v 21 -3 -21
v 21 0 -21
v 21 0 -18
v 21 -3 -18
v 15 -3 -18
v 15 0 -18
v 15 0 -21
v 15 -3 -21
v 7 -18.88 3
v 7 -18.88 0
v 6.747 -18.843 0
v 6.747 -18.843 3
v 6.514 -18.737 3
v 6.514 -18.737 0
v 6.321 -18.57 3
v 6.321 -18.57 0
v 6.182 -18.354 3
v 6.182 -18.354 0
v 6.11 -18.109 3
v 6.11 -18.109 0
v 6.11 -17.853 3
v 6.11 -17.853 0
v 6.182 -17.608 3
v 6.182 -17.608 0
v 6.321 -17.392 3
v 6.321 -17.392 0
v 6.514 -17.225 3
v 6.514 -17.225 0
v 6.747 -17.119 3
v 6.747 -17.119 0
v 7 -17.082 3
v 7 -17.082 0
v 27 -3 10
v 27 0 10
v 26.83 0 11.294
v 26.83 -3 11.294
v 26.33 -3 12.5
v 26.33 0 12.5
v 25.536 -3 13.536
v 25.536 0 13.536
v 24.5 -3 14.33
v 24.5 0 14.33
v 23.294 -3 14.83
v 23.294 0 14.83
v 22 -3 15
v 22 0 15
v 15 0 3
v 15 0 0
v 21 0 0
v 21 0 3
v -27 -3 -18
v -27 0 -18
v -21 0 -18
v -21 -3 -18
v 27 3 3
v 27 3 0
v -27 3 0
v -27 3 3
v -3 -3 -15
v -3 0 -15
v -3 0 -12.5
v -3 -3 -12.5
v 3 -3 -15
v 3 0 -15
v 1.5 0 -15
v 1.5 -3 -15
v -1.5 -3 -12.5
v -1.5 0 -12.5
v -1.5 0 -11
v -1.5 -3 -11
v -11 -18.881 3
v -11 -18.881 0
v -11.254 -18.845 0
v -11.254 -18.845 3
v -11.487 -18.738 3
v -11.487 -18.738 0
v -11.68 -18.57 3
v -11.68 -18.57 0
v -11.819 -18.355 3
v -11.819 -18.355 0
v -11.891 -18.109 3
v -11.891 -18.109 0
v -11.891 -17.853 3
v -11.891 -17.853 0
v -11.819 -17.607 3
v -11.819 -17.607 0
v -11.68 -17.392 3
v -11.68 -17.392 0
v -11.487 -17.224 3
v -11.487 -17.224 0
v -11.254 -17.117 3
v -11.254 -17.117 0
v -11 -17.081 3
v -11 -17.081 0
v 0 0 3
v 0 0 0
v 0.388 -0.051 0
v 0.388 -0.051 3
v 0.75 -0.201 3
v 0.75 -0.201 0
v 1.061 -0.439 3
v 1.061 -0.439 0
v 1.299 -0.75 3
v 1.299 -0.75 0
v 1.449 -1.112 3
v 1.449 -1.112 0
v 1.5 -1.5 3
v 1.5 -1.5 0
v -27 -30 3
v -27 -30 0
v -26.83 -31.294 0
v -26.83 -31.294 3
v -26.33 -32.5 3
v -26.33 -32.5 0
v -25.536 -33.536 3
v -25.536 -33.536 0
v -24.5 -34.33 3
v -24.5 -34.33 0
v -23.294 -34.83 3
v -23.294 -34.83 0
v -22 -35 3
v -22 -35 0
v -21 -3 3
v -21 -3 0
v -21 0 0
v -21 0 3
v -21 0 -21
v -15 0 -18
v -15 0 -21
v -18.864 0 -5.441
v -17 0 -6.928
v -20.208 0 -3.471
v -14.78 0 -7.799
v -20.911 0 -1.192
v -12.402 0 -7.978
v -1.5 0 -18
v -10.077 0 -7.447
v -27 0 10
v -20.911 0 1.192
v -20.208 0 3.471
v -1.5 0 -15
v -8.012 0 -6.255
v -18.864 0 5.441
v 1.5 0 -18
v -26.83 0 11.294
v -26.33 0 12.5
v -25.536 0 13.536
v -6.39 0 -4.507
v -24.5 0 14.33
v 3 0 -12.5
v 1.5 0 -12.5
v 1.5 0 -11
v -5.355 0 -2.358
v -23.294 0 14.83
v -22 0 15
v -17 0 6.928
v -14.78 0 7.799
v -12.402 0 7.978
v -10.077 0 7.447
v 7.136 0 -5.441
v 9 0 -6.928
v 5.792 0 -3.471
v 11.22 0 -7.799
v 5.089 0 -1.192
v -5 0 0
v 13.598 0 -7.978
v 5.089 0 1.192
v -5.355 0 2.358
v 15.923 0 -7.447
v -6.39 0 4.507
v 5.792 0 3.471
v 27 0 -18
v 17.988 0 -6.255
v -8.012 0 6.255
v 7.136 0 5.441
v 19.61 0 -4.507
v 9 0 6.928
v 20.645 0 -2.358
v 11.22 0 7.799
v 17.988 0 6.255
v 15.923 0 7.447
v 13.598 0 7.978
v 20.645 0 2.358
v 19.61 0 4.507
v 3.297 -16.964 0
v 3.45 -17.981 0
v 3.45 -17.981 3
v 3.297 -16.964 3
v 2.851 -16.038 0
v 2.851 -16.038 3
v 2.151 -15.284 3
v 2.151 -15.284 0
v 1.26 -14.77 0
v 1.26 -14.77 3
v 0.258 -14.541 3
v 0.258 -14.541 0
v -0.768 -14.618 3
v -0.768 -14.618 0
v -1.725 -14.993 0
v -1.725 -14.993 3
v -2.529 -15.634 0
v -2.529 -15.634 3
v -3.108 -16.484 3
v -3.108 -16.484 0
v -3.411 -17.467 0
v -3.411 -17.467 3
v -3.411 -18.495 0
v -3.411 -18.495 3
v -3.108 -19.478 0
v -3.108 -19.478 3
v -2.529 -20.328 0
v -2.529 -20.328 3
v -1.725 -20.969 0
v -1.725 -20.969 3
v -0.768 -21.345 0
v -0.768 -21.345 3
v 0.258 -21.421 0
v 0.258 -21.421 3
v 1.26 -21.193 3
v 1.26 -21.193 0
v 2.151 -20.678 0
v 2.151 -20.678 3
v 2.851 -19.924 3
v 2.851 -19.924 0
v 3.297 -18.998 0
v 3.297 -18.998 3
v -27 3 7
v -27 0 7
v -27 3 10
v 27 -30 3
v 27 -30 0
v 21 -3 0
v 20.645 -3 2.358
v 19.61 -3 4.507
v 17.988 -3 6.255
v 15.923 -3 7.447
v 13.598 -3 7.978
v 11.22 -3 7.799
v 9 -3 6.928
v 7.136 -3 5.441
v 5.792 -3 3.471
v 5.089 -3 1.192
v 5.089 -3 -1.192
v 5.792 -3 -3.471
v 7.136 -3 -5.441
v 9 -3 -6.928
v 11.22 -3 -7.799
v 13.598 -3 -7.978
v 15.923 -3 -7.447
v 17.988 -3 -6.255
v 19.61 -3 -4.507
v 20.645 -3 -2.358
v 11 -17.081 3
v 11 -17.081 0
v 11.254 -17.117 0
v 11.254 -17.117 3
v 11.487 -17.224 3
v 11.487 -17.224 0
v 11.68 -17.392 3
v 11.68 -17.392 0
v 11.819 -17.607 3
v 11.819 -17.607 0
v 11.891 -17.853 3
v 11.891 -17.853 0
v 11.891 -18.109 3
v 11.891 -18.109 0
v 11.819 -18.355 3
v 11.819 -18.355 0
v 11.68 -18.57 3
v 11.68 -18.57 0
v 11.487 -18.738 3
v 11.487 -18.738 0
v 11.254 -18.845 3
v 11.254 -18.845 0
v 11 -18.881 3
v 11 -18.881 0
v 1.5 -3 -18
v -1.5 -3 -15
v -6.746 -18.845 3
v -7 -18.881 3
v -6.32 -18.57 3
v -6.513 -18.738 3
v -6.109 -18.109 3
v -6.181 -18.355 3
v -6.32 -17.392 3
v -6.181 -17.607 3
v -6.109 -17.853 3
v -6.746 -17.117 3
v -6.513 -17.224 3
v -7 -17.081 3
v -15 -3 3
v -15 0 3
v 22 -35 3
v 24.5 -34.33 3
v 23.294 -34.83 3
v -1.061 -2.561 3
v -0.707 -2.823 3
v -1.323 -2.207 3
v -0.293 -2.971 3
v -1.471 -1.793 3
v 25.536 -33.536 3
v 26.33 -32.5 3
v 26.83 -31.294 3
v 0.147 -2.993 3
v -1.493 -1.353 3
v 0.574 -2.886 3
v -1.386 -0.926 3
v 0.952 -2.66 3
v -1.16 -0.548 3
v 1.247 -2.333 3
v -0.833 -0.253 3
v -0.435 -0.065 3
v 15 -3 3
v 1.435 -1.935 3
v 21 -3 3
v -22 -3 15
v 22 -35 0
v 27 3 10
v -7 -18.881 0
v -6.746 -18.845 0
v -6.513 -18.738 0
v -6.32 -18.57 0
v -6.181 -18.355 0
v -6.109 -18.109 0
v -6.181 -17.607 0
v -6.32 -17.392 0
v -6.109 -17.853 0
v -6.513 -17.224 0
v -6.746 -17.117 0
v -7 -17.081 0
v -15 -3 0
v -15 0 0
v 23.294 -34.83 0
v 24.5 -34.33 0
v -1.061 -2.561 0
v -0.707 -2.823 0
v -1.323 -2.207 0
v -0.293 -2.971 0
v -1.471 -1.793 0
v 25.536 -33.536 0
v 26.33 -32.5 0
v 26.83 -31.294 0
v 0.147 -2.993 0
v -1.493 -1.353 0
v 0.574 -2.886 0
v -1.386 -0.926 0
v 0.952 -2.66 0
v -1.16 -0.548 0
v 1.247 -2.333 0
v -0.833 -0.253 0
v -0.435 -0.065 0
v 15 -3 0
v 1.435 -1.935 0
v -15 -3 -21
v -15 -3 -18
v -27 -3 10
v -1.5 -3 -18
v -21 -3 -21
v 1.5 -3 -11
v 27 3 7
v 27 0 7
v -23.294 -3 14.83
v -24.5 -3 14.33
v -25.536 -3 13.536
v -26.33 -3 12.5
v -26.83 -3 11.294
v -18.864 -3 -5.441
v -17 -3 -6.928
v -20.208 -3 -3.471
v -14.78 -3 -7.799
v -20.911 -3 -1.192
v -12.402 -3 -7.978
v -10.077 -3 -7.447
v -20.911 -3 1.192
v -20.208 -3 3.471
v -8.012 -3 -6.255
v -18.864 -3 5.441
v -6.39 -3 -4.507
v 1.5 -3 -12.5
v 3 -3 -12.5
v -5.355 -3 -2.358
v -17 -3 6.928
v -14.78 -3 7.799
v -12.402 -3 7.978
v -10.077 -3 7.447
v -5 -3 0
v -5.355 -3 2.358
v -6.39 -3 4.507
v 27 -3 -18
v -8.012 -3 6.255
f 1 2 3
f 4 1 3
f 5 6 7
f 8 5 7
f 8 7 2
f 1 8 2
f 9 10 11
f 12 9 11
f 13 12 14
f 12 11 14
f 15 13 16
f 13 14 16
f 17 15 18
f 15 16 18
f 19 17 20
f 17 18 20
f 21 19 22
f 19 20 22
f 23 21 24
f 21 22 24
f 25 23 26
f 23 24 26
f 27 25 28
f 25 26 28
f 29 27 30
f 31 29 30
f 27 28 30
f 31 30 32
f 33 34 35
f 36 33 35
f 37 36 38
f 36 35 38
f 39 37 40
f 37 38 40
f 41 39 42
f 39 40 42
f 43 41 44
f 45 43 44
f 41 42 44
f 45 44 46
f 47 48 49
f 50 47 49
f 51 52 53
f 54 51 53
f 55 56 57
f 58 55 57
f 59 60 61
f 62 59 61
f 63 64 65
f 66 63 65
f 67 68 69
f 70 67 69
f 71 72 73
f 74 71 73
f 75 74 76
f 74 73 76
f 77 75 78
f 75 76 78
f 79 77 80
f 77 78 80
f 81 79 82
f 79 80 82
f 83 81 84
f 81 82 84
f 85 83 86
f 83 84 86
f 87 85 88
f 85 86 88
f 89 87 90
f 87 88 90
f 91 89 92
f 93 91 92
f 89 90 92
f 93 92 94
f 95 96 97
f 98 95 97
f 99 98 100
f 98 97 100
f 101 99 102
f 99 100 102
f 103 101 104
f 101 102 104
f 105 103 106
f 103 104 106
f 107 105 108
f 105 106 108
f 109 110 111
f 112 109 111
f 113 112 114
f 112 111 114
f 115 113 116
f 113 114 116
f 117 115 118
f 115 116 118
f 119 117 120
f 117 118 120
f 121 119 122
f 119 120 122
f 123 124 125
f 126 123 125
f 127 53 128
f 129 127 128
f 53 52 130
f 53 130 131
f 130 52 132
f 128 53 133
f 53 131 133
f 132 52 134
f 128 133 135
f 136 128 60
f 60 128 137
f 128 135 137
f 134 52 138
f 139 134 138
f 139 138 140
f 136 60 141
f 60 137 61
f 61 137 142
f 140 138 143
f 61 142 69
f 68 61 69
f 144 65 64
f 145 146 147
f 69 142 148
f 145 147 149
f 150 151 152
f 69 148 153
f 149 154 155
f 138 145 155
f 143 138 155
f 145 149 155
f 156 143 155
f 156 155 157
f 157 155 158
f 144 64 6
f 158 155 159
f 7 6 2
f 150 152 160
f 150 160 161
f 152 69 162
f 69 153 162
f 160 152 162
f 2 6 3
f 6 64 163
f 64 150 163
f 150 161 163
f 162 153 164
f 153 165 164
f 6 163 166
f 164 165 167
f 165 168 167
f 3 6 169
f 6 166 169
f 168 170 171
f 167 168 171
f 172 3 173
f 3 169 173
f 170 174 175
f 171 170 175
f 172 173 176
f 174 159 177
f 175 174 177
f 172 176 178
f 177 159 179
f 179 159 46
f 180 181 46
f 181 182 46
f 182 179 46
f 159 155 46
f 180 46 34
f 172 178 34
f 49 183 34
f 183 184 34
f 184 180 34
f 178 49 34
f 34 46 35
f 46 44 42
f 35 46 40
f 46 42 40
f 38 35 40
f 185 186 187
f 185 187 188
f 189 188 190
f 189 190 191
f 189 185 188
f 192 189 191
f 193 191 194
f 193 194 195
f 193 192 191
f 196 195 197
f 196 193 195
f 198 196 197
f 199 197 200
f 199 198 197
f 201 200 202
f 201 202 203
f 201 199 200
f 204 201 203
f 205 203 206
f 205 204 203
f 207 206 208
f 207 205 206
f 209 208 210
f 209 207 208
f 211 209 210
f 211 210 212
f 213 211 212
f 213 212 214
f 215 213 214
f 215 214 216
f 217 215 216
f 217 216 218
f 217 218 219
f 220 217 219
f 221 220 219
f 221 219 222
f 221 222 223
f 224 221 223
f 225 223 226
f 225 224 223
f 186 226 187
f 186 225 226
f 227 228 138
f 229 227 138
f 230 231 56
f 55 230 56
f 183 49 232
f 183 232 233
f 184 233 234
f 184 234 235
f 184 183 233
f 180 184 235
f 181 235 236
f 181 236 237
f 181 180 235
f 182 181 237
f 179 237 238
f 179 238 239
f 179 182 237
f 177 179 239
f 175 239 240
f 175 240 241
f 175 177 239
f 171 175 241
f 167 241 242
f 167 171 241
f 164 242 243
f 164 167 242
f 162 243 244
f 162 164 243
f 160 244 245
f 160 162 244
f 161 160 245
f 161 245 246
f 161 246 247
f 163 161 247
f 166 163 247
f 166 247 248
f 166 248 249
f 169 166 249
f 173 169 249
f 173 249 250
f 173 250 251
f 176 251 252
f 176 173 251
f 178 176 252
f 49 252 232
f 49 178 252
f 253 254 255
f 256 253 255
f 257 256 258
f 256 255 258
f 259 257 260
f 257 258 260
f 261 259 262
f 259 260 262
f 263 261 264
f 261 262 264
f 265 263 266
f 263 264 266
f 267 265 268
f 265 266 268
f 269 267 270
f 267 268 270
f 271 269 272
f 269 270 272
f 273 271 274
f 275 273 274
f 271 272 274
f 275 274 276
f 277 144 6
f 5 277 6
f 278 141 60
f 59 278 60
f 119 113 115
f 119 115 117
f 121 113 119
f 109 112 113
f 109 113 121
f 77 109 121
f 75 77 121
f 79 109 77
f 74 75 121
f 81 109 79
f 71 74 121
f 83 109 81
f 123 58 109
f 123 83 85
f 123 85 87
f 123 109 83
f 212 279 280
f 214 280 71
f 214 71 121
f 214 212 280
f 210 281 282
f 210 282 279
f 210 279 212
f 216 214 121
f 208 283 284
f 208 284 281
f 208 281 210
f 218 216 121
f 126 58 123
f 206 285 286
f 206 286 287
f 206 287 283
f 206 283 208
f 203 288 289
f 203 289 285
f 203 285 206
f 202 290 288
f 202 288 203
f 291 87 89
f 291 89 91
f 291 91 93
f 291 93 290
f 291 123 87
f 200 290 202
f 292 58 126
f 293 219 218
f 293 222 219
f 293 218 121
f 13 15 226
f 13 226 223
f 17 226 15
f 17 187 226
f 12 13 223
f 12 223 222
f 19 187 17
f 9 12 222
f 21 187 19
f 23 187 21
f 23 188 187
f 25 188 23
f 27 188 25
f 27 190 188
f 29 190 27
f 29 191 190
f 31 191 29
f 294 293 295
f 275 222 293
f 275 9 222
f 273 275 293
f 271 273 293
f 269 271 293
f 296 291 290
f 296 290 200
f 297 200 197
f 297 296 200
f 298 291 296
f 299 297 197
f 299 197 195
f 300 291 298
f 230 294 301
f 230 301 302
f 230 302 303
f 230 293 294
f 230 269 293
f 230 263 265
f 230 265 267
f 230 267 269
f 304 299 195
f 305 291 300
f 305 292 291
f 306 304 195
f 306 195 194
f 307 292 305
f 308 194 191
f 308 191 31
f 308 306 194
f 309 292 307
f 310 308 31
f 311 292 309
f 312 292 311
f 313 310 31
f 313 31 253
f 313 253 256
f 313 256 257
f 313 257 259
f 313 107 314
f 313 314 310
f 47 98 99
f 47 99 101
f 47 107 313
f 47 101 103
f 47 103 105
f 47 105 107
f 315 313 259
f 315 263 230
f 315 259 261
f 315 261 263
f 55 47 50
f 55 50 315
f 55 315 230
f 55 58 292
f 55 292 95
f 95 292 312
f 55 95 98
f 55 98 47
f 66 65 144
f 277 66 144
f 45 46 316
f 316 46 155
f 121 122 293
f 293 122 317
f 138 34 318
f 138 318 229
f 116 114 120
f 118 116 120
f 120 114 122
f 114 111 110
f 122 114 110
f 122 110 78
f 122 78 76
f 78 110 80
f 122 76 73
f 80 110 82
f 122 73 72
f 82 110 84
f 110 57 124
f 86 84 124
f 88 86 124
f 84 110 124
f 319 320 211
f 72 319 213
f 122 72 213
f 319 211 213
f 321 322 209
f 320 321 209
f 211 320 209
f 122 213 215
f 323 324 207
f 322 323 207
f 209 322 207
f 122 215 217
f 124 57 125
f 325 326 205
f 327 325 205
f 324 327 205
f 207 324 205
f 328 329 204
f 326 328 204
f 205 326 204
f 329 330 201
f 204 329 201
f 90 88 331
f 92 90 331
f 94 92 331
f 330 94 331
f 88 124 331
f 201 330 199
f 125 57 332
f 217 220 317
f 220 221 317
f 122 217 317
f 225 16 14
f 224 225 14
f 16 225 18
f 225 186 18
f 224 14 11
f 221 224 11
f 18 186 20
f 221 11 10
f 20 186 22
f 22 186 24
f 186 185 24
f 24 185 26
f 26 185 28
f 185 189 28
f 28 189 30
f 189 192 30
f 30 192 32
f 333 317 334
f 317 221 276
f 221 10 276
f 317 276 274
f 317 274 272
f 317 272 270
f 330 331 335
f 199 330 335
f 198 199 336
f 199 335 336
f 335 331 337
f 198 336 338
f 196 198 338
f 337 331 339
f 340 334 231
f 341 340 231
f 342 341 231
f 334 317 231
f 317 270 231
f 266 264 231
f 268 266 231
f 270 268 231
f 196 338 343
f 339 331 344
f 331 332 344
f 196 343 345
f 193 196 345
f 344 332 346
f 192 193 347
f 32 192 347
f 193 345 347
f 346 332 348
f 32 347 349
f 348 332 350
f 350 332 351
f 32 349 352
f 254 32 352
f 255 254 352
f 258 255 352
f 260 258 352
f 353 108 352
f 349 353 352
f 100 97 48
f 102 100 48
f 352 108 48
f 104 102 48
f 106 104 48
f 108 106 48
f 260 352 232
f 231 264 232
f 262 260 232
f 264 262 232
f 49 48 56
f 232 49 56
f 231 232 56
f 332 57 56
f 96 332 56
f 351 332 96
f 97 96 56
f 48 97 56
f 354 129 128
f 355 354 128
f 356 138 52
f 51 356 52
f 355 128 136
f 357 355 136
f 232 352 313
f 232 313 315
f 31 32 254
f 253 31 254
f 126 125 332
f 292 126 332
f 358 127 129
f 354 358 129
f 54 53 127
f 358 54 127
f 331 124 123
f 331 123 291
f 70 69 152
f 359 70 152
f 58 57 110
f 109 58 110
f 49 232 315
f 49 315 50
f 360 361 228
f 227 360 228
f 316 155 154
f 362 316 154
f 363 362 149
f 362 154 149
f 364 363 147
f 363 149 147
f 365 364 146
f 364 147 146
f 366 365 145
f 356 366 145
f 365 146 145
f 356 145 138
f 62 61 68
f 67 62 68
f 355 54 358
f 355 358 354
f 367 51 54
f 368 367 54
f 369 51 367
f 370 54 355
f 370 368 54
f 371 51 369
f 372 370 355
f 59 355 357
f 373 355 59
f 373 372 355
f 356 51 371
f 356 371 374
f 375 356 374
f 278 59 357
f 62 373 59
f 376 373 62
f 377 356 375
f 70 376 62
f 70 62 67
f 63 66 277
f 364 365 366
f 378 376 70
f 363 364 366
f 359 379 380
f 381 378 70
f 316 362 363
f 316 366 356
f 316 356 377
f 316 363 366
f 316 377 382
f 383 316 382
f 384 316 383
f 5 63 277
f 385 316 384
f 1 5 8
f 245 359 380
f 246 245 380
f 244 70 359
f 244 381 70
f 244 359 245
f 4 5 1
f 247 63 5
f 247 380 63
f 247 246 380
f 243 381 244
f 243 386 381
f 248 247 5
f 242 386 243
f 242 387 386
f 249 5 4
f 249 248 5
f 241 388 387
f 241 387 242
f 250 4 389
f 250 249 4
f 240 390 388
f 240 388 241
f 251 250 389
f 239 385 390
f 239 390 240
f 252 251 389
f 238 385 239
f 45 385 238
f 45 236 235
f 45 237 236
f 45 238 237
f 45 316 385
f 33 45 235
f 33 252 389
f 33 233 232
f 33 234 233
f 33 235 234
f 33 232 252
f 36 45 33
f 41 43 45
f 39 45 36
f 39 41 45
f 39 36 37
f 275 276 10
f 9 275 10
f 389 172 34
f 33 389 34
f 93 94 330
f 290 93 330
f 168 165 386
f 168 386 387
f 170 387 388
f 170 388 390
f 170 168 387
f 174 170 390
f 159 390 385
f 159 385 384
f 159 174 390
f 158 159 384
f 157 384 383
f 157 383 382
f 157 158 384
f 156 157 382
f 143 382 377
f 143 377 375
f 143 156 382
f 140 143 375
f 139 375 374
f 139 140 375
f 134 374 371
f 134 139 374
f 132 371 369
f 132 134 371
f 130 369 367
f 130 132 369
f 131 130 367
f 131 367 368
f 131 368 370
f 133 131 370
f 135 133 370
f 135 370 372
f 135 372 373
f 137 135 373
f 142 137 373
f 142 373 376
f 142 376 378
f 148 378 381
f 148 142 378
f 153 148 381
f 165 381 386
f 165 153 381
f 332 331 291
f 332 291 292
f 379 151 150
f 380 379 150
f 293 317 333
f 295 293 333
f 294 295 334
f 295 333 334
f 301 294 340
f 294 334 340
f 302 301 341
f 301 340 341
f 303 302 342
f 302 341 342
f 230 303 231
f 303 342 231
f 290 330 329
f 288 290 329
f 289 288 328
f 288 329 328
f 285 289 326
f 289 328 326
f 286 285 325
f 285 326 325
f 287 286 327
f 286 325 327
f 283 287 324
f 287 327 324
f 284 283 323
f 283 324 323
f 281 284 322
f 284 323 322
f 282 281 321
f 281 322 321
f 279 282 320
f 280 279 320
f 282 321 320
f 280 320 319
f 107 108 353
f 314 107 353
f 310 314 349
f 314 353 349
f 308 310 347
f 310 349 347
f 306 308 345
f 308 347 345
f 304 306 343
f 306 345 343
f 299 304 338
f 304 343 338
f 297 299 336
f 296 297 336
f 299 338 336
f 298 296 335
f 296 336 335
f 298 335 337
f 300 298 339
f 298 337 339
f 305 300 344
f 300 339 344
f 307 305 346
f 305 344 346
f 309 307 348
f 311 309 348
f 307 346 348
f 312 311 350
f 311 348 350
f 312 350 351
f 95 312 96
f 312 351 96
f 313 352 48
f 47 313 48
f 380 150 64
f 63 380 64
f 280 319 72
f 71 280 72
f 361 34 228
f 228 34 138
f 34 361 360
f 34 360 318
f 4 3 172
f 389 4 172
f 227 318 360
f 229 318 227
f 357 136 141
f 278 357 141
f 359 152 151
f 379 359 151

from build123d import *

# Parameters (mm, degrees)
F0_R     = 8
F1_DEPTH = 3
F2_W     = 54
F2_H     = 3
F3_DEPTH = 3
F4_R     = 3.45
F4_W     = 6
F4_H     = 3
F5_DEPTH = 3


# Not quite as in the source:
# - a feature names something its author has since deleted; it is built from what else it names


with BuildPart() as f1:
    # F0 (on Front) → F1 (new body)
    with BuildSketch(Plane.XZ):
        with BuildLine():
            Line((22, 15), (-22, 15))
            ThreePointArc((-22, 15), (-25.5355339059, 13.5355339059), (-27, 10))
            Line((-27, 10), (-27, -15))
            Line((-27, -15), (-27, -18))
            Line((-27, -18), (-21, -18))
            Line((-21, -18), (-21, -21))
            Line((-21, -21), (-15, -21))
            Line((-15, -21), (-15, -18))
            Line((-15, -18), (-9, -18))
            Line((-9, -18), (-3, -18))
            Line((-3, -18), (-1.5, -18))
            Line((-1.5, -18), (-1.5, -15))
            Line((-1.5, -15), (-3, -15))
            Line((-3, -15), (-3, -12.5))
            Line((-3, -12.5), (-1.5, -12.5))
            Line((-1.5, -12.5), (-1.5, -11))
            Line((-1.5, -11), (0, -11))
            Line((0, -11), (1.5, -11))
            Line((1.5, -11), (1.5, -12.5))
            Line((1.5, -12.5), (3, -12.5))
            Line((3, -12.5), (3, -15))
            Line((3, -15), (1.5, -15))
            Line((1.5, -15), (1.5, -18))
            Line((1.5, -18), (3, -18))
            Line((3, -18), (9, -18))
            Line((9, -18), (15, -18))
            Line((15, -18), (15, -21))
            Line((15, -21), (21, -21))
            Line((21, -21), (21, -18))
            Line((21, -18), (27, -18))
            Line((27, -18), (27, -15))
            Line((27, -15), (27, 10))
            ThreePointArc((27, 10), (25.5355339059, 13.5355339059), (22, 15))
        make_face()
        with Locations((-13, 0)):
            Circle(F0_R, mode=Mode.SUBTRACT)
        with Locations((13, 0)):
            Circle(F0_R, mode=Mode.SUBTRACT)
    extrude(amount=F1_DEPTH)


with BuildPart() as f3:
    # F2 (on face) → F3 (new body)
    with BuildSketch(Plane(origin=(0, 0, 0), x_dir=(-1, 0, 0), z_dir=(0, 1, 0))):
        with Locations((0, 8.5)):
            Rectangle(F2_W, F2_H)
    extrude(amount=F3_DEPTH)


with BuildPart() as f5:
    # F4 (on Top) → F5 (new body)
    with BuildSketch(Plane.XY):
        with BuildLine():
            Line((-27, 0), (-27, -3))
            Line((-27, -3), (-27, -30))
            ThreePointArc((-27, -30), (-25.5355339059, -33.5355339059), (-22, -35))
            Line((-22, -35), (22, -35))
            ThreePointArc((22, -35), (25.5355339059, -33.5355339059), (27, -30))
            Line((27, -30), (27, -3))
            Line((27, -3), (27, 0))
            Line((27, 0), (27, 3))
            Line((27, 3), (-27, 3))
            Line((-27, 3), (-27, 0))
        make_face()
        with BuildLine():
            Line((-7, -18.8810304218), (-11, -18.8810304218))
            ThreePointArc((-11, -18.8810304218), (-11.9, -17.9810304218), (-11, -17.0810304218))
            Line((-11, -17.0810304218), (-7, -17.0810304218))
            ThreePointArc((-7, -17.0810304218), (-6.1, -17.9810304218), (-7, -18.8810304218))
        make_face(mode=Mode.SUBTRACT)
        with Locations((0, -17.9810304218)):
            Circle(F4_R, mode=Mode.SUBTRACT)
        with BuildLine():
            ThreePointArc((11, -17.0810304218), (11.9, -17.9810304218), (11, -18.8810304218))
            Line((11, -18.8810304218), (7, -18.8798223013))
            ThreePointArc((7, -18.8798223013), (6.1012081205, -17.9810304218), (7, -17.0822385423))
            Line((7, -17.0822385423), (11, -17.0810304218))
        make_face(mode=Mode.SUBTRACT)
        with Locations((-18, -1.5)):
            Rectangle(F4_W, F4_H, mode=Mode.SUBTRACT)
        with BuildLine():
            ThreePointArc((0, 0), (1.0606601718, -0.4393398282), (1.5, -1.5))
            ThreePointArc((1.5, -1.5), (-1.0606601718, -2.5606601718), (0, 0))
        make_face(mode=Mode.SUBTRACT)
        with Locations((18, -1.5)):
            Rectangle(F4_W, F4_H, mode=Mode.SUBTRACT)
    extrude(amount=F5_DEPTH)


solid = Compound([f1.part, f3.part, f5.part])
